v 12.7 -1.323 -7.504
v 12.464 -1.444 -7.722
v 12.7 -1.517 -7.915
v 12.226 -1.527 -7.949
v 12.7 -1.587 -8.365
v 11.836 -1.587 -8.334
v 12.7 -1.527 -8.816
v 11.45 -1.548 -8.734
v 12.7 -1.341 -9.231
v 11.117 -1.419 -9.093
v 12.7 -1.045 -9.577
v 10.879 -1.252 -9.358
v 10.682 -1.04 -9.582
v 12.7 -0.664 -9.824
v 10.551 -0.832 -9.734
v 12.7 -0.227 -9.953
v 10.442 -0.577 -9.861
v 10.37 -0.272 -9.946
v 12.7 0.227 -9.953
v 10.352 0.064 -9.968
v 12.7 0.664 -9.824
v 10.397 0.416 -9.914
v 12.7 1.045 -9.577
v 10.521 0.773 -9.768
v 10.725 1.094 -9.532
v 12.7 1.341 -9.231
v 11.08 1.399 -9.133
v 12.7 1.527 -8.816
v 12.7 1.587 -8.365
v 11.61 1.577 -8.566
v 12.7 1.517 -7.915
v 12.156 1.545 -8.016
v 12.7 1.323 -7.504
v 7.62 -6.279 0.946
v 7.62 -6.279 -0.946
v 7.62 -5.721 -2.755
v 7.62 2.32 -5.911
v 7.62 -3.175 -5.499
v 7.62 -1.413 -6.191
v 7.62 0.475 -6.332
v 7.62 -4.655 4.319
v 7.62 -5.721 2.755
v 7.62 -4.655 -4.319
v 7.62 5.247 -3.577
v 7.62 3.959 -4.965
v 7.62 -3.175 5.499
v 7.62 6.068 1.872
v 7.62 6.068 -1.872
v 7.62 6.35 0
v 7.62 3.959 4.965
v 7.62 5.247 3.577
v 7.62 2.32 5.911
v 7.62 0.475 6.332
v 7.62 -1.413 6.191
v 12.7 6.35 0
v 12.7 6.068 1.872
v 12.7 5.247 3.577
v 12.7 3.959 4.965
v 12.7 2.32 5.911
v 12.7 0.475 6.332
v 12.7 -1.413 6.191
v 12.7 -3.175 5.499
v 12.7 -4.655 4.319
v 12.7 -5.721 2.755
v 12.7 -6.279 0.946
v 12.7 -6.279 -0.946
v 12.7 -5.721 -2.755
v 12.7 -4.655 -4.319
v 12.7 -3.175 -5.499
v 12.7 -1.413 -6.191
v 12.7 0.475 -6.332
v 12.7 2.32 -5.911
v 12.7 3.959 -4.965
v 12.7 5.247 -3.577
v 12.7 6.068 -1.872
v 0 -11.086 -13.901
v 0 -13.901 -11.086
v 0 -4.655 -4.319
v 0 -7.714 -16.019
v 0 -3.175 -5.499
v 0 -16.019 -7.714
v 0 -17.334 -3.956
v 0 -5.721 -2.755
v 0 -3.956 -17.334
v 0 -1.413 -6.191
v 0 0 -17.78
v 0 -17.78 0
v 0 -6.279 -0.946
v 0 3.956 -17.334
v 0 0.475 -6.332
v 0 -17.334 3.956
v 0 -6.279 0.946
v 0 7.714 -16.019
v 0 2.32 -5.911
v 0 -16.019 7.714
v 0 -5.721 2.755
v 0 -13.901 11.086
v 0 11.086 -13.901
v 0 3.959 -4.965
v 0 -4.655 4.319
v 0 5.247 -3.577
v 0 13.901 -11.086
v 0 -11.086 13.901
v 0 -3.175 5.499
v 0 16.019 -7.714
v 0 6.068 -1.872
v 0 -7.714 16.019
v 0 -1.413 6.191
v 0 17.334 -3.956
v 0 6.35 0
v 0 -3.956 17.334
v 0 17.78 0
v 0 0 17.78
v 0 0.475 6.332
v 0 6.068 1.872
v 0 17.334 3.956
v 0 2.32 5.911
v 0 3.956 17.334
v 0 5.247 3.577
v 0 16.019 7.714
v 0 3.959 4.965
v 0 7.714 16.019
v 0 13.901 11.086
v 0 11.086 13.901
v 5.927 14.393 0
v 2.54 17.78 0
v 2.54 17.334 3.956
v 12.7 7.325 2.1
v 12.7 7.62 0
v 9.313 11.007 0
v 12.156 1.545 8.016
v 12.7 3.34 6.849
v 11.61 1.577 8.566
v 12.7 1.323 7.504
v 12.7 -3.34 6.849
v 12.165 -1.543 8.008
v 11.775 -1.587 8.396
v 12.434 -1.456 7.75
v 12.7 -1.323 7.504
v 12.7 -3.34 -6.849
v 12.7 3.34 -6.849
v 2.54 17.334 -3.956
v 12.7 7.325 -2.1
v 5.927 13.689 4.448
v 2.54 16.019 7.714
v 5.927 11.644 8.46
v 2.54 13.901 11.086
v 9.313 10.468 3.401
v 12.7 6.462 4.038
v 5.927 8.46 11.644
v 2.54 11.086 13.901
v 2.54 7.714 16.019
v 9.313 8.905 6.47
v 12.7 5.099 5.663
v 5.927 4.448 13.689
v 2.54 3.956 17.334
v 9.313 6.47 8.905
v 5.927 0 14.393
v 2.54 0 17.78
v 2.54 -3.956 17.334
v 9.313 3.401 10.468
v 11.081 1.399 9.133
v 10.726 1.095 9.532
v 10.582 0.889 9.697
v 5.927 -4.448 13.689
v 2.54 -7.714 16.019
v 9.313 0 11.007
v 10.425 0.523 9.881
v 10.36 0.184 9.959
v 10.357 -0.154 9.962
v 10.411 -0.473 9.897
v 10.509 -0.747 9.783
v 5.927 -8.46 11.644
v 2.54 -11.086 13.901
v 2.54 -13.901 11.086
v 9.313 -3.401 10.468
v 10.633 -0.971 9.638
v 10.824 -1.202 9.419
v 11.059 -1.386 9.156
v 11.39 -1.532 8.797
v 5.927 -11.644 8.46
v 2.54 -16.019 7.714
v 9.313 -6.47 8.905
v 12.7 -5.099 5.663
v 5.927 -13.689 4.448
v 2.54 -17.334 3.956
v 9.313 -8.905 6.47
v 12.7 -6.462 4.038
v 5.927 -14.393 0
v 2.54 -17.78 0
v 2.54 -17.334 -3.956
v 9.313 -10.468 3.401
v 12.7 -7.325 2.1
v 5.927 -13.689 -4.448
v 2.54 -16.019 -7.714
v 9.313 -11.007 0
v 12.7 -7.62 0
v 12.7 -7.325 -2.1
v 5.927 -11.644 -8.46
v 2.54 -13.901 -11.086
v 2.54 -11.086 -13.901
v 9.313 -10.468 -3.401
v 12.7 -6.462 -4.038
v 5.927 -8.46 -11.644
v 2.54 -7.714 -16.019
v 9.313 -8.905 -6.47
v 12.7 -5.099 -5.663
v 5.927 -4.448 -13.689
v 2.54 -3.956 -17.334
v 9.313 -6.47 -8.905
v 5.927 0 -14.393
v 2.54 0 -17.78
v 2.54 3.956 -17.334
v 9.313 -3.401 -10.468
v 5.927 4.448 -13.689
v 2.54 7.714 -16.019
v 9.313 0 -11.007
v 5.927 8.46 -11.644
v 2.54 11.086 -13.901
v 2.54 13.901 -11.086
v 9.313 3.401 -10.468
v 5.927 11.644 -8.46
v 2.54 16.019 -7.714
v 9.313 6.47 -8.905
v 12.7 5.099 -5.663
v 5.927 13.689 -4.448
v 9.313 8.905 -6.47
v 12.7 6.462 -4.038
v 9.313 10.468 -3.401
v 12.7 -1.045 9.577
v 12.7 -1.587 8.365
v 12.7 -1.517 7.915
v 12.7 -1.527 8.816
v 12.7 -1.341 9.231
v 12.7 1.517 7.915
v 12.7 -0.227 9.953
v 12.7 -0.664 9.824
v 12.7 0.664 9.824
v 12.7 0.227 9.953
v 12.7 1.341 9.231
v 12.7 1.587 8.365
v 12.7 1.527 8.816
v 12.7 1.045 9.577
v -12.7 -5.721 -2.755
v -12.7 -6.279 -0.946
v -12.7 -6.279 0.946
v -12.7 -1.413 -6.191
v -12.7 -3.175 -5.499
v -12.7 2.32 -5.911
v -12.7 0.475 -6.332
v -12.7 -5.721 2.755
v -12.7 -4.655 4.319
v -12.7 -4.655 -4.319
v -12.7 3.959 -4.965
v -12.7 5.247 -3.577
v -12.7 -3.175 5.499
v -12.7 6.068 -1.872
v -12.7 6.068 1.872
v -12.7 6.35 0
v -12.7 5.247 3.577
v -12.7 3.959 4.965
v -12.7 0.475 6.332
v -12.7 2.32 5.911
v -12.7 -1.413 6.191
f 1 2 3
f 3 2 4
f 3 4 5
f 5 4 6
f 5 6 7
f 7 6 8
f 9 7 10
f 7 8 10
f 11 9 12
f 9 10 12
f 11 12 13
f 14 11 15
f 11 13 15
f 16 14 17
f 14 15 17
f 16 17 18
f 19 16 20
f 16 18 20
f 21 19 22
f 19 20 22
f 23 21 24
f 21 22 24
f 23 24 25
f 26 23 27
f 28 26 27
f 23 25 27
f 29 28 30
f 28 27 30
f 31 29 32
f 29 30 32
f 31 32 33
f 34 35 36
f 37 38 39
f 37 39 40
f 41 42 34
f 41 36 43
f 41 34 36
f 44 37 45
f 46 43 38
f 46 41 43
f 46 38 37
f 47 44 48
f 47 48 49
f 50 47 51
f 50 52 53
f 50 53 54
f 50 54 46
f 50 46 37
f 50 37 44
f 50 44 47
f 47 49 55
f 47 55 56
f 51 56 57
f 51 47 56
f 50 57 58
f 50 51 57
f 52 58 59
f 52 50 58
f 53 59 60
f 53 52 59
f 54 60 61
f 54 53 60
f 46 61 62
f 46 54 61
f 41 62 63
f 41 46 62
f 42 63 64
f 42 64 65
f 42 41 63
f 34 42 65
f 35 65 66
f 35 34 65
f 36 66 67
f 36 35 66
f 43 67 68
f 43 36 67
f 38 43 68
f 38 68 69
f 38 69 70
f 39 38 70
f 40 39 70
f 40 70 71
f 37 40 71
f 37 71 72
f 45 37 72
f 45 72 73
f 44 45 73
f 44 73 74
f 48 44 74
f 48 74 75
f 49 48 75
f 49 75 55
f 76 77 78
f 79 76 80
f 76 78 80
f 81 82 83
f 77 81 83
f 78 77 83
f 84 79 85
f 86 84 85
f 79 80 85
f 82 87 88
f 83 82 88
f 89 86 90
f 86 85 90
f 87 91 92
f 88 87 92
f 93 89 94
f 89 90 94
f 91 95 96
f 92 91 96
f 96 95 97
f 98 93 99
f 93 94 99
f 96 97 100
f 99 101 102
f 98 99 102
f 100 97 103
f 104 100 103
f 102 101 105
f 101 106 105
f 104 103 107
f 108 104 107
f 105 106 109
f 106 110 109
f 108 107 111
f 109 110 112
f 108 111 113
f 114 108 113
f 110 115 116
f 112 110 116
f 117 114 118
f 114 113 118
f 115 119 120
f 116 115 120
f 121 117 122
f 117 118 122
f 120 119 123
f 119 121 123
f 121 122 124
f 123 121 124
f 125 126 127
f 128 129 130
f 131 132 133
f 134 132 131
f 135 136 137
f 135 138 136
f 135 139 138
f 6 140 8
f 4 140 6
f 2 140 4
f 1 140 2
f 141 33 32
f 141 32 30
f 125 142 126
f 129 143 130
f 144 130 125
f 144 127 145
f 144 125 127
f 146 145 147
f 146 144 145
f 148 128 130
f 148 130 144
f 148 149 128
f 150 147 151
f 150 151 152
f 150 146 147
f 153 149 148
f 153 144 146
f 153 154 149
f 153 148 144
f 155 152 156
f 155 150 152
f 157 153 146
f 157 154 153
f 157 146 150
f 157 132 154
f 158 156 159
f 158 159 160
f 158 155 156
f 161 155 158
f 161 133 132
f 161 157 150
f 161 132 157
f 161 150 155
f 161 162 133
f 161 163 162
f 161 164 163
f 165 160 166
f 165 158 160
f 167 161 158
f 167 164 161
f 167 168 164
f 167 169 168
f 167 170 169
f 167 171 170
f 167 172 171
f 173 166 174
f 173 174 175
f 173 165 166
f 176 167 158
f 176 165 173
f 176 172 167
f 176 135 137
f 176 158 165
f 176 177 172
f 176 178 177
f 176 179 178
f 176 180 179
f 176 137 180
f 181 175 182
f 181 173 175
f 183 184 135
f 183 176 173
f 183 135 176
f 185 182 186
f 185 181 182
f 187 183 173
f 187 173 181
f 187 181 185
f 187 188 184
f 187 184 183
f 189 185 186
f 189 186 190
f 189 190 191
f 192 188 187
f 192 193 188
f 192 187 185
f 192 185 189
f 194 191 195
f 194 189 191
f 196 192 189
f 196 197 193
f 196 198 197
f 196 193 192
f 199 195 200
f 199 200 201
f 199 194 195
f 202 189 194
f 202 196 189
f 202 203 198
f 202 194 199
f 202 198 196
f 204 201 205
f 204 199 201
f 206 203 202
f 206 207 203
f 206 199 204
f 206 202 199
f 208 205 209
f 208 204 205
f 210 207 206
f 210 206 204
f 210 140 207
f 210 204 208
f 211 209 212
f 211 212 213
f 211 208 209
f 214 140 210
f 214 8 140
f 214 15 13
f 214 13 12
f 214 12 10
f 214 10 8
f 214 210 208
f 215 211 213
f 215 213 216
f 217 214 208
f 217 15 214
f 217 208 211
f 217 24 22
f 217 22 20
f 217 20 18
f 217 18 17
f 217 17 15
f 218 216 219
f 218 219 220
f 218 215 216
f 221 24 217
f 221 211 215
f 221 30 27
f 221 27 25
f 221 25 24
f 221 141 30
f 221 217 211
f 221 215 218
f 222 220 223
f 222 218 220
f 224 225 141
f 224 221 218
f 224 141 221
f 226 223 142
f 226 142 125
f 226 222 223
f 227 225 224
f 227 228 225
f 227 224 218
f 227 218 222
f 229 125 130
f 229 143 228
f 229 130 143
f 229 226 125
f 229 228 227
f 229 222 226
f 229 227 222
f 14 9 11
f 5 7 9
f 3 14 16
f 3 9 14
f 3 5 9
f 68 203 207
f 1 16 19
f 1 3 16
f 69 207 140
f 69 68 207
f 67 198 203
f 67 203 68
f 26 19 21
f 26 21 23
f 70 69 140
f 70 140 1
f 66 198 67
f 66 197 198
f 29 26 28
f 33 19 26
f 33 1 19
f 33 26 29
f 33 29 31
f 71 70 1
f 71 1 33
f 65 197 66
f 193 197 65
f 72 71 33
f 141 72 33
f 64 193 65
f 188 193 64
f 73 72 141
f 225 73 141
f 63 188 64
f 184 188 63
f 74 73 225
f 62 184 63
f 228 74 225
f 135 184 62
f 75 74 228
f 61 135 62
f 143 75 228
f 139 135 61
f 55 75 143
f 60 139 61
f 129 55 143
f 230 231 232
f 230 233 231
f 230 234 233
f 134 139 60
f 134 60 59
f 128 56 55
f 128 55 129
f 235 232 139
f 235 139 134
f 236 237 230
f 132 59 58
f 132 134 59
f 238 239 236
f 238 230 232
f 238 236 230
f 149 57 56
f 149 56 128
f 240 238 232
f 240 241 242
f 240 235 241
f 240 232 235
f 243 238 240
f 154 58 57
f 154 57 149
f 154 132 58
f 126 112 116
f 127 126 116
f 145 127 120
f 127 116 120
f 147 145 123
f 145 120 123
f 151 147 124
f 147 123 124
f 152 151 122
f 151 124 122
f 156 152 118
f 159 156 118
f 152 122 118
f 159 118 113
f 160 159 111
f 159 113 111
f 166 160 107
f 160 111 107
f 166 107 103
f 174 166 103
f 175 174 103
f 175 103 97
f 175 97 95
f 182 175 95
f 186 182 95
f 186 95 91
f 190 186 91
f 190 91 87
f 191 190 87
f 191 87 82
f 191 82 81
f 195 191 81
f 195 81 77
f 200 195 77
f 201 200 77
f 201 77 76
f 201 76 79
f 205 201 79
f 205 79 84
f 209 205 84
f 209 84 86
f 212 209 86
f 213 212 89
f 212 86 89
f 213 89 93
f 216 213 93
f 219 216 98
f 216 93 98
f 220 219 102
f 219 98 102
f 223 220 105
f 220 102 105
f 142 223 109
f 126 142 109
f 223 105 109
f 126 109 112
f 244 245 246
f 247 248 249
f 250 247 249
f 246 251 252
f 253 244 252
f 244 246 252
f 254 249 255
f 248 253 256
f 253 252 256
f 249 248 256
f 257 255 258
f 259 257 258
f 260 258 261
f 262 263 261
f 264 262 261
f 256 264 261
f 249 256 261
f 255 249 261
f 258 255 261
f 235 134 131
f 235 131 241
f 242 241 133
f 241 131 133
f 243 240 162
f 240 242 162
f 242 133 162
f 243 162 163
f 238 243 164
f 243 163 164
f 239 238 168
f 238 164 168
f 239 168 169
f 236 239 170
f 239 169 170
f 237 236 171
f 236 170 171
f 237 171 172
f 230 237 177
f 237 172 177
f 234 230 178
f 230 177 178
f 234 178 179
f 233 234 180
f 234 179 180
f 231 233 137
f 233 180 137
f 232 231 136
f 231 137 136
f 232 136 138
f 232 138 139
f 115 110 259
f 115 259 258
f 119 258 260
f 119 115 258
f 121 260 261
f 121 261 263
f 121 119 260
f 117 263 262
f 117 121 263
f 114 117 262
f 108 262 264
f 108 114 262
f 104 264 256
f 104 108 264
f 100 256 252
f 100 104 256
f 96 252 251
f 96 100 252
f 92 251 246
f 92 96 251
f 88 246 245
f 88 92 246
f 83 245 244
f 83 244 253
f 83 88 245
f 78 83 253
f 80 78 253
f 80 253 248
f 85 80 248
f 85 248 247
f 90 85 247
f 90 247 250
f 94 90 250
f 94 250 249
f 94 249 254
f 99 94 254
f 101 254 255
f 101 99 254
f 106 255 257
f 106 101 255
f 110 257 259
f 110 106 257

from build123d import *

# Parameters (mm, degrees)
F0_R     = 17.78
F0_R_2   = 1.5875
F0_R_3   = 6.35
F1_DEPTH = 12.7
F3_DEPTH = 7.62
F4_DEPTH = 12.7
F5_DEPTH = 12.7


# Not quite as in the source:
# - a fillet or chamfer that OpenCascade refuses, or shapes differently, is made with other operations: its cross-section is extruded or revolved along the edge and cut away or added


with BuildPart() as f1:
    # F0 (on Right) → F1 (new body)
    with BuildSketch(Plane.YZ):
        Circle(F0_R)
        with Locations((0, -8.382)):
            Circle(F0_R_2, mode=Mode.SUBTRACT)
        Circle(F0_R_3, mode=Mode.SUBTRACT)
        with Locations((0, 8.382)):
            Circle(F0_R_2, mode=Mode.SUBTRACT)
    extrude(amount=F1_DEPTH)

    # F2: chamfer of 10.16 on 1 edges, made by hand

    # F2_s1 → F2_t2 (revolve, cut)
    with BuildSketch(Plane.XY):
        Polygon((2.54, 17.78), (12.7, 7.62), (12.7, 17.78), align=None)
    revolve(axis=Axis((12.7, 0, 0), (1, 0, 0)), mode=Mode.SUBTRACT)

    # F0 (on Right) → F3 (join)
    with BuildSketch(Plane.YZ):
        Circle(F0_R_3)
    extrude(amount=F3_DEPTH)

    # F0 (on Right) → F4 (join)
    with BuildSketch(Plane.YZ):
        with Locations((0, 8.382)):
            Circle(F0_R_2)
        with Locations((0, -8.382)):
            Circle(F0_R_2)
    extrude(amount=F4_DEPTH)

    # F0 (on Right) → F5 (join)
    with BuildSketch(Plane.YZ):
        Circle(F0_R_3)
    extrude(amount=-F5_DEPTH)


solid = f1.part
